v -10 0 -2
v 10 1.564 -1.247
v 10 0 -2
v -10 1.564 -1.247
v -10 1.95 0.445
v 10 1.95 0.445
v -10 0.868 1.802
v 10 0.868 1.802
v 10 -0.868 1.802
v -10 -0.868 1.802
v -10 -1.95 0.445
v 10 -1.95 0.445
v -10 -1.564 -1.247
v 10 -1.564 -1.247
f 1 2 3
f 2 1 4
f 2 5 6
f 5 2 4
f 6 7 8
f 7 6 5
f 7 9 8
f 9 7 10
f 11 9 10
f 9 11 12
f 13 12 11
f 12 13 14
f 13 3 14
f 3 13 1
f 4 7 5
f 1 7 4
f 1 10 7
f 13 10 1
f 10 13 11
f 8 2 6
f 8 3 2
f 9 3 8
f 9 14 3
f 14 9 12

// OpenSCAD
union(){
%translate([-10, 0, 0]) sphere(r=5);
rotate([0,90,0]) cylinder(r=2, h=20, center=true);
%translate([10, 0, 0]) sphere(r=5);
}
